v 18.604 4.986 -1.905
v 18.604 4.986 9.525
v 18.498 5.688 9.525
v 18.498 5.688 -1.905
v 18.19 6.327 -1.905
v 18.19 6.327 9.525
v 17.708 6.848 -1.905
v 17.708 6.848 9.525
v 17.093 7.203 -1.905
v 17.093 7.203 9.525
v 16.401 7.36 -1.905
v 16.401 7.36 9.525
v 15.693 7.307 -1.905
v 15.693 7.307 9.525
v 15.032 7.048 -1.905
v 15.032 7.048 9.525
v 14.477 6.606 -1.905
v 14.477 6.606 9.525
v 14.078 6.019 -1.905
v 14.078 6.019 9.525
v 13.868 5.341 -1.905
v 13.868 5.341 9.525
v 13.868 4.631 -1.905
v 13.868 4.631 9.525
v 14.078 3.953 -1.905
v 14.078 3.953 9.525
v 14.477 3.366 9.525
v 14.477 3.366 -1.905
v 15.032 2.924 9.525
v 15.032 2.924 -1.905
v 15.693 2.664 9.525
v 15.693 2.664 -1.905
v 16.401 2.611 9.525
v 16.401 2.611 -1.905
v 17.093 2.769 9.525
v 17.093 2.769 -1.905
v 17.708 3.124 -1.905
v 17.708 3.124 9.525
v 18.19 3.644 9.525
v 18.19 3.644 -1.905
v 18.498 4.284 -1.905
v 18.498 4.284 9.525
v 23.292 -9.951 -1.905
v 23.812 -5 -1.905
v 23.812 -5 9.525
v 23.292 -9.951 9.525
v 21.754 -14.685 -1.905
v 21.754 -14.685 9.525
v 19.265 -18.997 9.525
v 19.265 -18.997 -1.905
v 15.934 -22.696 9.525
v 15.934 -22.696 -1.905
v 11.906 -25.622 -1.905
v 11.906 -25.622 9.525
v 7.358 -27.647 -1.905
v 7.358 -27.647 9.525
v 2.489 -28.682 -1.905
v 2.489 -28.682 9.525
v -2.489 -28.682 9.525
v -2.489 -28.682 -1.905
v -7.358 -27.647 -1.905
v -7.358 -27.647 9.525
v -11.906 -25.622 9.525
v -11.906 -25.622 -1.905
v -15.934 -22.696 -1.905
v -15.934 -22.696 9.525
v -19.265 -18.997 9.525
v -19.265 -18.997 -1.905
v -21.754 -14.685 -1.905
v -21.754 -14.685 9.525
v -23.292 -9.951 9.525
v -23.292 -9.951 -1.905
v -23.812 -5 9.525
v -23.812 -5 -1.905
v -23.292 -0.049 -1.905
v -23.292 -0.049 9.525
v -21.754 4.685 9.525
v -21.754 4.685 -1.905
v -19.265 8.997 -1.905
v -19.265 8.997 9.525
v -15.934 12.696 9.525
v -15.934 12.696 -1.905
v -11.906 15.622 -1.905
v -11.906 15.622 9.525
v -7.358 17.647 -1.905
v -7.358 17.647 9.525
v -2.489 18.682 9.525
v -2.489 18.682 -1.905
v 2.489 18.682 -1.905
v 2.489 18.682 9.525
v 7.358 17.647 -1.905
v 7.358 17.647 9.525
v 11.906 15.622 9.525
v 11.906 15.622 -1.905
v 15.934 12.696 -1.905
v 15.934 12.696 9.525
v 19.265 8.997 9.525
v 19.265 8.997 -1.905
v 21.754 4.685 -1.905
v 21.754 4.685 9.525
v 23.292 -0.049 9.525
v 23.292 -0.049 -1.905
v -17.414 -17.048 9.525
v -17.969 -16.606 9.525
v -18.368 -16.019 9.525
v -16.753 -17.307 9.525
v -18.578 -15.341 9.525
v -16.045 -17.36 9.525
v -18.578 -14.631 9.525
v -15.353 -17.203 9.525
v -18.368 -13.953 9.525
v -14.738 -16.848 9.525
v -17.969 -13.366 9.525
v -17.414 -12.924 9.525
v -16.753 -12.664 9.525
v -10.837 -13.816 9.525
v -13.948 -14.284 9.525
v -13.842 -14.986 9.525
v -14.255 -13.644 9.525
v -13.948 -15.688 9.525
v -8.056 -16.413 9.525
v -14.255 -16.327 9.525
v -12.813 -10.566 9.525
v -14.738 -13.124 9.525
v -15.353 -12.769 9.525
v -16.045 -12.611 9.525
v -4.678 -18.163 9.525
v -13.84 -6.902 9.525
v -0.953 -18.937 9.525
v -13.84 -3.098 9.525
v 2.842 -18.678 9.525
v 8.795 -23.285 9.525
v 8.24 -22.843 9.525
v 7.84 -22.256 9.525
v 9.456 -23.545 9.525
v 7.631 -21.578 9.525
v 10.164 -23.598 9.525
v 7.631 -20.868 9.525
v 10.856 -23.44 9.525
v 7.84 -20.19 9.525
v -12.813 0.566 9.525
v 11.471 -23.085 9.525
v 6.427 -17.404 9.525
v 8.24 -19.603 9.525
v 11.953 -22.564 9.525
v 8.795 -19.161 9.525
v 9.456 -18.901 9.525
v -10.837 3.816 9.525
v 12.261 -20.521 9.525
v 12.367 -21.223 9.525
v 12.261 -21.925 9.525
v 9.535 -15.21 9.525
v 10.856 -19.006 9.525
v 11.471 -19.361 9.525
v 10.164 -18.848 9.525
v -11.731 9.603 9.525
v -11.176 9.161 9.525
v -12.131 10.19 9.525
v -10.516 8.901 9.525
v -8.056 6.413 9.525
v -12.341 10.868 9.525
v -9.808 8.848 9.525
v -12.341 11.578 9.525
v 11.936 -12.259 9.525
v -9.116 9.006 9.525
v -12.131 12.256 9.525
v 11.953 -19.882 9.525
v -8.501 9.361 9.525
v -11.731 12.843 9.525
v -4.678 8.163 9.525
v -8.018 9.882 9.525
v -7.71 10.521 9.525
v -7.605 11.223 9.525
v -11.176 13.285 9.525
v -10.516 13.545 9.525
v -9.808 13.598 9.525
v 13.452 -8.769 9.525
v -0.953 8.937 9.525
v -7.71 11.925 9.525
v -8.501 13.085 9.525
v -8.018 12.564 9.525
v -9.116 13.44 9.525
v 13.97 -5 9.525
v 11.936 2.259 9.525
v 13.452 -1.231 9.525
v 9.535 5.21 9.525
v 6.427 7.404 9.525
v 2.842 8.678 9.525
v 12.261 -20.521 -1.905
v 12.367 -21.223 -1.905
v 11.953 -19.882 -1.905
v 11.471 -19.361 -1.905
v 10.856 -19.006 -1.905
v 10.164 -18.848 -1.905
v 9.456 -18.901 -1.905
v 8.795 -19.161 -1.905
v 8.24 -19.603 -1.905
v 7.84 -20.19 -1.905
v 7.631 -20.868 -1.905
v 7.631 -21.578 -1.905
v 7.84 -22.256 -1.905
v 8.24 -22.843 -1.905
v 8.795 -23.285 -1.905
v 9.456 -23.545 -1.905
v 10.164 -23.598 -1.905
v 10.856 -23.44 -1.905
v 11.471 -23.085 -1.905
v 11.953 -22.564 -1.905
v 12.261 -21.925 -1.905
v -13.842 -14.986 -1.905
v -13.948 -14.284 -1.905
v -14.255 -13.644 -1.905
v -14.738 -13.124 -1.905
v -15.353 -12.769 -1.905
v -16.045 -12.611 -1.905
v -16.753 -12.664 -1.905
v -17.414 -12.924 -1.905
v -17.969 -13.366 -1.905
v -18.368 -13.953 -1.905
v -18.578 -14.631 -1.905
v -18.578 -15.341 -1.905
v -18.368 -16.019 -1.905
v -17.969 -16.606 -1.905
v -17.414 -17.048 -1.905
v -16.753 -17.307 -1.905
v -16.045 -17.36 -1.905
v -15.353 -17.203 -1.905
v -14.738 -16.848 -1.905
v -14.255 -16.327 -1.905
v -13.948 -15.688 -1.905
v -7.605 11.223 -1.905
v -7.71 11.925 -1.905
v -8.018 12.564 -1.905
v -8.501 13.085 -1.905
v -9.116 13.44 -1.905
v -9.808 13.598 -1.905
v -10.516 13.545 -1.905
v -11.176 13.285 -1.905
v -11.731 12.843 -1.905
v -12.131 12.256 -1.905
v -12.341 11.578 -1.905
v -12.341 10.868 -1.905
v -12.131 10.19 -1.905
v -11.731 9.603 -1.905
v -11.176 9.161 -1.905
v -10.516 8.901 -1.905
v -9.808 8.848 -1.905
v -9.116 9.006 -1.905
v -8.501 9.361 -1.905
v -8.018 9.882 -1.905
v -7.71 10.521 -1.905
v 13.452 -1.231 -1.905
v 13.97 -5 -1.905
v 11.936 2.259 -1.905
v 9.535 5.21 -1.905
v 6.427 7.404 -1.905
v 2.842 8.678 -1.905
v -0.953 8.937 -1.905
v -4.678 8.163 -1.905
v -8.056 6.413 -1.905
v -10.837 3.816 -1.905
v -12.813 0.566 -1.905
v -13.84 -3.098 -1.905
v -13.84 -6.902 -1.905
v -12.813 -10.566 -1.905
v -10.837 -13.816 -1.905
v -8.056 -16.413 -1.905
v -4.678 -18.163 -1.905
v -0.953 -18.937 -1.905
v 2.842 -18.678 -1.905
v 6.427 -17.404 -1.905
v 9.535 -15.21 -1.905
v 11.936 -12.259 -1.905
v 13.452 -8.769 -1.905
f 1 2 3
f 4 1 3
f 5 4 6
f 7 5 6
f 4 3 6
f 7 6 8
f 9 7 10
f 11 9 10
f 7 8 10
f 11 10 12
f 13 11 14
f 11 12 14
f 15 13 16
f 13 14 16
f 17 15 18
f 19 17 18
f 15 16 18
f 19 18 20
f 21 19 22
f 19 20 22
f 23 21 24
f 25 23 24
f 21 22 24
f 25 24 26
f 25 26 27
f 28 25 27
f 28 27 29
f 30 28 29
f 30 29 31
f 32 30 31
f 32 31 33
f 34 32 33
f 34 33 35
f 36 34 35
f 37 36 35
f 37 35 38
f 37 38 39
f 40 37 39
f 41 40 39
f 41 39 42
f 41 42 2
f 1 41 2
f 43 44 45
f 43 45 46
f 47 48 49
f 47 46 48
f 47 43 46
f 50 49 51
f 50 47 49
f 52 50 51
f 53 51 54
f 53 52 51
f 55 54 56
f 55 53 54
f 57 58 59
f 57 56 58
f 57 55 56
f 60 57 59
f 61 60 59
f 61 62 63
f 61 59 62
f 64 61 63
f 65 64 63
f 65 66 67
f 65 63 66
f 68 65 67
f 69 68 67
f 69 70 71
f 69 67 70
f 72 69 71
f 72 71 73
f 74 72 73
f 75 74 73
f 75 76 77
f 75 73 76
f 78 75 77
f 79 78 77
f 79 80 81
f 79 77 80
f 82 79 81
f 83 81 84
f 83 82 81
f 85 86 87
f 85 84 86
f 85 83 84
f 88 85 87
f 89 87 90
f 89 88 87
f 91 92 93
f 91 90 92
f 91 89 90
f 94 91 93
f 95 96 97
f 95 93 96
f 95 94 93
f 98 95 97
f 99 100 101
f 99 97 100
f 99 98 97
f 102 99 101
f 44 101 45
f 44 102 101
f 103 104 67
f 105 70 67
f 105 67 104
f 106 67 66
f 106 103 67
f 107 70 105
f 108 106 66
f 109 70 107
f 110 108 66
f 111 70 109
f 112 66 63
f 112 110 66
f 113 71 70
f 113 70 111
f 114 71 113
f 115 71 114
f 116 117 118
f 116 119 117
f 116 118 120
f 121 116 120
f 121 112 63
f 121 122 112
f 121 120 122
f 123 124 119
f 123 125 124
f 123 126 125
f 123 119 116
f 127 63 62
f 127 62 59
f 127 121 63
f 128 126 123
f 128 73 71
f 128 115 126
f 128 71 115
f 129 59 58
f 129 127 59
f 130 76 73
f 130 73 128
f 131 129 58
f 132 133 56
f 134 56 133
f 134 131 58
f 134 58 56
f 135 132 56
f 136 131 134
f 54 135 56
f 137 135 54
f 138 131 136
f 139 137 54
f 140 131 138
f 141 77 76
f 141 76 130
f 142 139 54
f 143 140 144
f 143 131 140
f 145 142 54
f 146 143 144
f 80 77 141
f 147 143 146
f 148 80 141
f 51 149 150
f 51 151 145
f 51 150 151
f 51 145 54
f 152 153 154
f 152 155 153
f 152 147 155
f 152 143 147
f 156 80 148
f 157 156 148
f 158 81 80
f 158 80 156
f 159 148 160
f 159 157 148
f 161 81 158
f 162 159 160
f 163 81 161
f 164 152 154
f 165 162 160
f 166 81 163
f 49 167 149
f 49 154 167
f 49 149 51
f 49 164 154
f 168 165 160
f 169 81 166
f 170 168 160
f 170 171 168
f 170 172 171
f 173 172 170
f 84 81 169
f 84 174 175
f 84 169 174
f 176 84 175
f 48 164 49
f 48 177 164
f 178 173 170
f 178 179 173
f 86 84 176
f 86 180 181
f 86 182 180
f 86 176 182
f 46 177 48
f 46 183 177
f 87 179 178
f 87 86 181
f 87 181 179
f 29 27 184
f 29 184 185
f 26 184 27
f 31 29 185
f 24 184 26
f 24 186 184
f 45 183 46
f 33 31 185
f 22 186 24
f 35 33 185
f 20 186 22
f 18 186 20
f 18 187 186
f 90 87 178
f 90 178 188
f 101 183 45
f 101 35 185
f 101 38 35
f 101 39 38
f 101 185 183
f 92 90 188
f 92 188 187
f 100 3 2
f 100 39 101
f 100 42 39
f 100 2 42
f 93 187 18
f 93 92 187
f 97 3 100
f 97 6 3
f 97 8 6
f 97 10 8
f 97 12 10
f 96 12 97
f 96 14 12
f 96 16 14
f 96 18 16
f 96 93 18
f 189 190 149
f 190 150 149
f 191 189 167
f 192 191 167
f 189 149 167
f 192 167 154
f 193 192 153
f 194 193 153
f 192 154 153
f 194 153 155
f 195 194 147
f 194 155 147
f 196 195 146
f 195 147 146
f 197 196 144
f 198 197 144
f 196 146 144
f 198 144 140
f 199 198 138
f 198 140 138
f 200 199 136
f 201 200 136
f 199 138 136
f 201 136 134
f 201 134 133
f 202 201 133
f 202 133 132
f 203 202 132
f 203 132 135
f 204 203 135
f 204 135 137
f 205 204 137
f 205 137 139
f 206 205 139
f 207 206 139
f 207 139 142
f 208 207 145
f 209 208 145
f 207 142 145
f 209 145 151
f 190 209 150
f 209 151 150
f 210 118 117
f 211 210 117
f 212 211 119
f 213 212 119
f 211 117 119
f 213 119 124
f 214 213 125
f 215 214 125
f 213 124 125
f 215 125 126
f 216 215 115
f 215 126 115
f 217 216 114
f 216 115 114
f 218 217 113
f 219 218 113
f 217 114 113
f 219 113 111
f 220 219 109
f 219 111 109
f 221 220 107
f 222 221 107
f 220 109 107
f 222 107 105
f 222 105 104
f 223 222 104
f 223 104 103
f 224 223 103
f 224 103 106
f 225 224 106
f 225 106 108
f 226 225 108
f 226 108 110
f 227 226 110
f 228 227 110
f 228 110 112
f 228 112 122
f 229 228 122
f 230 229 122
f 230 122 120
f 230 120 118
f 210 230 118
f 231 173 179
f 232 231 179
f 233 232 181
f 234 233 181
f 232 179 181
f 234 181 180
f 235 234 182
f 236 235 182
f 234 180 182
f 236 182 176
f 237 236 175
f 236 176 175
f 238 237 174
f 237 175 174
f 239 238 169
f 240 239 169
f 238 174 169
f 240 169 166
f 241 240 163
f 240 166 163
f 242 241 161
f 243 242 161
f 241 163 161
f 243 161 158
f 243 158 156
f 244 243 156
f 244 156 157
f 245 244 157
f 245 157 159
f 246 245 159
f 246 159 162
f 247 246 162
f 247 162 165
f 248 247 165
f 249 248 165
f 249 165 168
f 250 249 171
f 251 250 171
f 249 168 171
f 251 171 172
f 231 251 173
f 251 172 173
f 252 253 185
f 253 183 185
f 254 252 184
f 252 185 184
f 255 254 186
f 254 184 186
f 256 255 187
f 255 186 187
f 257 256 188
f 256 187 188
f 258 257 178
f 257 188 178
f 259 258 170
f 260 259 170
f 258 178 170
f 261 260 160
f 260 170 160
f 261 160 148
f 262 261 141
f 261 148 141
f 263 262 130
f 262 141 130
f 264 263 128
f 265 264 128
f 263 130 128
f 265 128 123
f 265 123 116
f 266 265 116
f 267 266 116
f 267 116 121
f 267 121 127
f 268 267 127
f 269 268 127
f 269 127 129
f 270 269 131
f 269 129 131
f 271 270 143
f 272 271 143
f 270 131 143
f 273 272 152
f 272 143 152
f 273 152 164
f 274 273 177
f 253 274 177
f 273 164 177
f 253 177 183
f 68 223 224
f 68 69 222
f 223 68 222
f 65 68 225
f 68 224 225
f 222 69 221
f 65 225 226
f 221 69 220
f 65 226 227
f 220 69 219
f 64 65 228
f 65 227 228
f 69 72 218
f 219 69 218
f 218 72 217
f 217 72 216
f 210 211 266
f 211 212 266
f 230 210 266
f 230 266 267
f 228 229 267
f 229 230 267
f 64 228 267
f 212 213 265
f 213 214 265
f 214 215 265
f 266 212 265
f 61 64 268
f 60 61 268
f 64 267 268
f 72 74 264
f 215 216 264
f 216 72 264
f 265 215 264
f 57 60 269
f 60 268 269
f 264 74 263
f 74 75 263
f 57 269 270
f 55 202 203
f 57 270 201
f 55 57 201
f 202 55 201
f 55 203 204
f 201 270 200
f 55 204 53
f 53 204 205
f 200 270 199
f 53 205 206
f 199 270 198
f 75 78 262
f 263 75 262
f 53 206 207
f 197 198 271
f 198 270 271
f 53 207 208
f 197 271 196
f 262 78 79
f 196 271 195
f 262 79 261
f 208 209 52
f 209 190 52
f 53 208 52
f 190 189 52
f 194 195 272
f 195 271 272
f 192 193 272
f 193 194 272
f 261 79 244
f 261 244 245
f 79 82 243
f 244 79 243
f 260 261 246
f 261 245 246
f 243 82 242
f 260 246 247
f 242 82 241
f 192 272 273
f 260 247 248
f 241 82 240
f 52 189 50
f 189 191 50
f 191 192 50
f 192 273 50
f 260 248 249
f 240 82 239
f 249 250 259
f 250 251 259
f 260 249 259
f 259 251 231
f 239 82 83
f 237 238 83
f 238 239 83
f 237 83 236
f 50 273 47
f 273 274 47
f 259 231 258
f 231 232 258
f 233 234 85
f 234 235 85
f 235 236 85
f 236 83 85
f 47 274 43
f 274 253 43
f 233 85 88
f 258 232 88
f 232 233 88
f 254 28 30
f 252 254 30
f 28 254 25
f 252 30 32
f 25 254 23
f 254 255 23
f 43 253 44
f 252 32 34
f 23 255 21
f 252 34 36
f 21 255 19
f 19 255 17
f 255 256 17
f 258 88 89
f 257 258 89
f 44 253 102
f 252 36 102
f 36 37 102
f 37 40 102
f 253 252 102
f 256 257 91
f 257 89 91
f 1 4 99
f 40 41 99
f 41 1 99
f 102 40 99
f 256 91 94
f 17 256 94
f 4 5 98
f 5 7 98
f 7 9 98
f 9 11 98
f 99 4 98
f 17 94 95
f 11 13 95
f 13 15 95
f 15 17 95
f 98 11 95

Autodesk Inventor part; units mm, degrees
ref_plane "YZ Plane" through (0, 0, 0) normal (1, 0, 0) x (0, 1, 0)
ref_plane "XZ Plane" through (0, 0, 0) normal (0, 1, 0) x (-1, 0, 0)
ref_plane "XY Plane" through (0, 0, 0) normal (0, 0, 1) x (1, 0, 0)
sketch "Sketch1" plane through (0, 0, 0) normal (0, 0, 1) x (1, 0, 0)
  circle A0 centre (0, -5) radius 23.8125
  ellipse E0 centre (-25.066556, -29.009567) end of major axis (-17.396721, -26.490299) minor radius 5.878917 (-26.90757, -23.426346) -> (-26.90757, -23.426346) ccw
  line L0 (-26.90757, -23.426346) -> (-27.832023, -23.737709)
  line L1 (-29.265886, -21.408265) -> (-28.524708, -20.677009)
  ellipse E1 centre (-32.727164, -16.564341) end of major axis (-27.02296, -10.851314) minor radius 5.879236 (-28.571485, -20.72316) -> (-28.525164, -20.676548) ccw
  ellipse E2 centre (-32.346551, -17.58951) end of major axis (-24.296384, -18.197133) minor radius 5.879035 (-31.91081, -11.726643) -> (-31.91081, -11.726643) ccw
  line L2 (-31.91081, -11.726643) -> (-32.884047, -11.660532)
  line L3 (-33.317324, -8.95969) -> (-32.352726, -8.567735)
  ellipse E3 centre (-34.661269, -3.160316) end of major axis (-27.205269, -0.065183) minor radius 5.878801 (-32.413603, -8.592472) -> (-32.35297, -8.567134) ccw
  ellipse E4 centre (-34.70212, -4.252716) end of major axis (-41.906987, -0.610674) minor radius 5.879052 (-32.055919, 0.997131) -> (-32.055919, 0.997131) ccw
  line L4 (-32.055919, 0.997131) -> (-32.929773, 1.430651)
  line L5 (-32.296502, 4.091711) -> (-31.255334, 4.084695)
  ellipse E5 centre (-31.318819, 9.963759) end of major axis (-23.246042, 9.970002) minor radius 5.878619 (-31.321044, 4.085138) -> (-31.25533, 4.085343) ccw
  ellipse E6 centre (-31.774878, 8.970095) end of major axis (-37.03772, 15.092271) minor radius 5.879409 (-27.320805, 12.807895) -> (-27.320805, 12.807895) ccw
  line L6 (-27.320805, 12.807895) -> (-27.96224, 13.542826)
  line L7 (-26.35883, 15.758982) -> (-25.399601, 15.354063)
  ellipse E7 centre (-23.208166, 20.81056) end of major axis (-30.669277, 23.894301) minor radius 5.879328 (-25.46014, 15.379618) -> (-25.399349, 15.35466) ccw
  ellipse E8 centre (-24.009591, 20.066548) end of major axis (-26.528865, 27.736399) minor radius 5.878942 (-18.426346, 21.90757) -> (-18.426346, 21.90757) ccw
  line L8 (-18.426346, 21.90757) -> (-18.737709, 22.832023)
  line L9 (-16.408265, 24.265886) -> (-15.677009, 23.524708)
  ellipse E9 centre (-11.564623, 27.726877) end of major axis (-17.277457, 33.430884) minor radius 5.878834 (-15.72316, 23.571485) -> (-15.676548, 23.525164) ccw
  ellipse E10 centre (-12.589421, 27.346544) end of major axis (-11.981802, 35.39665) minor radius 5.878946 (-6.726643, 26.91081) -> (-6.726643, 26.91081) ccw
  line L10 (-6.726643, 26.91081) -> (-6.660532, 27.884047)
  line L11 (-3.95969, 28.317324) -> (-3.567735, 27.352726)
  ellipse E11 centre (1.839847, 29.661337) end of major axis (-1.255331, 37.11745) minor radius 5.878977 (-3.592472, 27.413603) -> (-3.567134, 27.35297) ccw
  ellipse E12 centre (0.747946, 29.701782) end of major axis (4.389762, 36.906192) minor radius 5.878309 (5.997131, 27.055919) -> (5.997131, 27.055919) ccw
  line L12 (5.997131, 27.055919) -> (6.430651, 27.929773)
  line L13 (9.091711, 27.296502) -> (9.084695, 26.255334)
  ellipse E13 centre (14.963894, 26.318821) end of major axis (14.957652, 34.391691) minor radius 5.878755 (9.085138, 26.321044) -> (9.085343, 26.25533) ccw
  ellipse E14 centre (13.970251, 26.774696) end of major axis (20.092302, 32.03743) minor radius 5.87917 (17.807895, 22.320805) -> (17.807895, 22.320805) ccw
  line L14 (17.807895, 22.320805) -> (18.542826, 22.96224)
  line L15 (20.758982, 21.35883) -> (20.354063, 20.399601)
  ellipse E15 centre (25.810277, 18.208281) end of major axis (28.893936, 25.669199) minor radius 5.879023 (20.379618, 20.46014) -> (20.35466, 20.399349) ccw
  ellipse E16 centre (25.066434, 19.009945) end of major axis (32.736527, 21.529301) minor radius 5.879314 (26.90757, 13.426346) -> (26.90757, 13.426346) ccw
  line L16 (26.90757, 13.426346) -> (27.832023, 13.737709)
  line L17 (29.265886, 11.408265) -> (28.524708, 10.677009)
  ellipse E17 centre (32.727281, 6.564224) end of major axis (38.431566, 12.277331) minor radius 5.879402 (28.571485, 10.72316) -> (28.525164, 10.676548) ccw
  ellipse E18 centre (32.346566, 7.5897) end of major axis (40.396864, 6.982068) minor radius 5.879226 (31.91081, 1.726643) -> (31.91081, 1.726643) ccw
  line L18 (31.91081, 1.726643) -> (32.884047, 1.660532)
  line L19 (33.317324, -1.04031) -> (32.352726, -1.432265)
  ellipse E19 centre (34.661448, -6.840109) end of major axis (42.117742, -3.744858) minor radius 5.879261 (32.413603, -1.407528) -> (32.35297, -1.432866) ccw
  ellipse E20 centre (34.701968, -5.747582) end of major axis (27.497307, -2.105643) minor radius 5.878717 (32.055919, -10.997131) -> (32.055919, -10.997131) ccw
  line L20 (32.055919, -10.997131) -> (32.929773, -11.430651)
  line L21 (32.296502, -14.091711) -> (31.255334, -14.084695)
  ellipse E21 centre (31.318824, -19.964675) end of major axis (39.392231, -19.958437) minor radius 5.879535 (31.321044, -14.085138) -> (31.25533, -14.085343) ccw
  ellipse E22 centre (31.774631, -18.970306) end of major axis (26.511936, -12.848298) minor radius 5.879085 (27.320805, -22.807895) -> (27.320805, -22.807895) ccw
  line L22 (27.320805, -22.807895) -> (27.96224, -23.542826)
  line L23 (26.35883, -25.758982) -> (25.399601, -25.354063)
  ellipse E23 centre (23.208233, -30.810396) end of major axis (15.747234, -27.726703) minor radius 5.879151 (25.46014, -25.379618) -> (25.399349, -25.35466) ccw
  ellipse E24 centre (24.00979, -30.066484) end of major axis (21.49047, -22.396496) minor radius 5.879152 (18.426346, -31.90757) -> (18.426346, -31.90757) ccw
  line L24 (18.426346, -31.90757) -> (18.737709, -32.832023)
  line L25 (16.408265, -34.265886) -> (15.677009, -33.524708)
  ellipse E25 centre (11.564423, -37.72708) end of major axis (5.851452, -32.022934) minor radius 5.879119 (15.72316, -33.571485) -> (15.676548, -33.525164) ccw
  ellipse E26 centre (12.58943, -37.346545) end of major axis (13.19705, -29.296433) minor radius 5.878955 (6.726643, -36.91081) -> (6.726643, -36.91081) ccw
  line L26 (6.726643, -36.91081) -> (6.660532, -37.884047)
  line L27 (3.95969, -38.317324) -> (3.567735, -37.352726)
  ellipse E27 centre (-1.840043, -39.66142) end of major axis (-4.935276, -32.205172) minor radius 5.87919 (3.592472, -37.413603) -> (3.567134, -37.35297) ccw
  ellipse E28 centre (-0.747551, -39.701984) end of major axis (2.8944, -32.497302) minor radius 5.878752 (-5.997131, -37.055919) -> (-5.997131, -37.055919) ccw
  line L28 (-5.997131, -37.055919) -> (-6.430651, -37.929773)
  line L29 (-9.091711, -37.296502) -> (-9.084695, -36.255334)
  ellipse E29 centre (-14.964581, -36.318823) end of major axis (-14.970819, -28.245481) minor radius 5.879441 (-9.085138, -36.321044) -> (-9.085343, -36.25533) ccw
  ellipse E30 centre (-13.970405, -36.774515) end of major axis (-7.848476, -31.511889) minor radius 5.878932 (-17.807895, -32.320805) -> (-17.807895, -32.320805) ccw
  line L30 (-17.807895, -32.320805) -> (-18.542826, -32.96224)
  line L31 (-20.758982, -31.35883) -> (-20.354063, -30.399601)
  ellipse E31 centre (-25.810473, -28.208202) end of major axis (-22.726757, -20.74715) minor radius 5.879234 (-20.379618, -30.46014) -> (-20.35466, -30.399349) ccw
  arc A1 (-20.35466, -30.399349) -> (-19.644418, -27.762867) centre (-30.622228, -26.219462) ccw
  arc A2 (-19.644418, -27.762867) -> (-24.163023, -22.894122) centre (-23.857511, -27.141776) ccw
  arc A3 (-24.163023, -22.894122) -> (-26.845089, -23.405986) centre (-23.441695, -33.956404) ccw
  arc A4 (-28.525164, -20.676548) -> (-26.860048, -18.512554) centre (-36.411586, -12.885608) ccw
  arc A5 (-26.860048, -18.512554) -> (-29.171506, -12.285224) centre (-30.514757, -16.32646) ccw
  arc A6 (-29.171506, -12.285224) -> (-31.845294, -11.731743) centre (-32.738439, -22.781481) ccw
  arc A7 (-32.35297, -8.567134) -> (-29.986479, -7.205076) centre (-36.657611, 1.648759) ccw
  arc A8 (-29.986479, -7.205076) -> (-29.738892, -0.567217) centre (-32.526408, -3.786792) ccw
  arc A9 (-29.738892, -0.567217) -> (-31.997342, 0.967347) centre (-37.051052, -8.899488) ccw
  arc A10 (-31.25533, 4.085343) -> (-28.54774, 4.438104) centre (-31.322846, 15.170913) ccw
  arc A11 (-28.54774, 4.438104) -> (-25.778801, 10.475939) centre (-29.586208, 8.568175) ccw
  arc A12 (-25.778801, 10.475939) -> (-27.278084, 12.757962) centre (-35.722978, 5.576167) ccw
  arc A13 (-25.399349, 15.35466) -> (-22.762867, 14.644418) centre (-21.219462, 25.622228) ccw
  arc A14 (-22.762867, 14.644418) -> (-17.894122, 19.163023) centre (-22.141776, 18.857511) ccw
  arc A15 (-17.894122, 19.163023) -> (-18.405986, 21.845089) centre (-28.956404, 18.441695) ccw
  arc A16 (-15.676548, 23.525164) -> (-13.512554, 21.860048) centre (-7.885608, 31.411586) ccw
  arc A17 (-13.512554, 21.860048) -> (-7.285224, 24.171506) centre (-11.32646, 25.514757) ccw
  arc A18 (-7.285224, 24.171506) -> (-6.731743, 26.845294) centre (-17.781481, 27.738439) ccw
  arc A19 (-3.567134, 27.35297) -> (-2.205076, 24.986479) centre (6.648759, 31.657611) ccw
  arc A20 (-2.205076, 24.986479) -> (4.432783, 24.738892) centre (1.213208, 27.526408) ccw
  arc A21 (4.432783, 24.738892) -> (5.967347, 26.997342) centre (-3.899488, 32.051052) ccw
  arc A22 (9.085343, 26.25533) -> (9.438104, 23.54774) centre (20.170913, 26.322846) ccw
  arc A23 (9.438104, 23.54774) -> (15.475939, 20.778801) centre (13.568175, 24.586208) ccw
  arc A24 (15.475939, 20.778801) -> (17.757962, 22.278084) centre (10.576167, 30.722978) ccw
  arc A25 (20.35466, 20.399349) -> (19.644418, 17.762867) centre (30.622228, 16.219462) ccw
  arc A26 (19.644418, 17.762867) -> (24.163023, 12.894122) centre (23.857511, 17.141776) ccw
  arc A27 (24.163023, 12.894122) -> (26.845089, 13.405986) centre (23.441695, 23.956404) ccw
  arc A28 (28.525164, 10.676548) -> (26.860048, 8.512554) centre (36.411586, 2.885608) ccw
  arc A29 (26.860048, 8.512554) -> (29.171506, 2.285224) centre (30.514757, 6.32646) ccw
  arc A30 (29.171506, 2.285224) -> (31.845294, 1.731743) centre (32.738439, 12.781481) ccw
  arc A31 (32.35297, -1.432866) -> (29.986479, -2.794924) centre (36.657611, -11.648759) ccw
  arc A32 (29.986479, -2.794924) -> (29.738892, -9.432783) centre (32.526408, -6.213208) ccw
  arc A33 (29.738892, -9.432783) -> (31.997342, -10.967347) centre (37.051052, -1.100512) ccw
  arc A34 (31.25533, -14.085343) -> (28.54774, -14.438104) centre (31.322846, -25.170913) ccw
  arc A35 (28.54774, -14.438104) -> (25.778801, -20.475939) centre (29.586208, -18.568175) ccw
  arc A36 (25.778801, -20.475939) -> (27.278084, -22.757962) centre (35.722978, -15.576167) ccw
  arc A37 (25.399349, -25.35466) -> (22.762867, -24.644418) centre (21.219462, -35.622228) ccw
  arc A38 (22.762867, -24.644418) -> (17.894122, -29.163023) centre (22.141776, -28.857511) ccw
  arc A39 (17.894122, -29.163023) -> (18.405986, -31.845089) centre (28.956404, -28.441695) ccw
  arc A40 (15.676548, -33.525164) -> (13.512554, -31.860048) centre (7.885608, -41.411586) ccw
  arc A41 (13.512554, -31.860048) -> (7.285224, -34.171506) centre (11.32646, -35.514757) ccw
  arc A42 (7.285224, -34.171506) -> (6.731743, -36.845294) centre (17.781481, -37.738439) ccw
  arc A43 (3.567134, -37.35297) -> (2.205076, -34.986479) centre (-6.648759, -41.657611) ccw
  arc A44 (2.205076, -34.986479) -> (-4.432783, -34.738892) centre (-1.213208, -37.526408) ccw
  arc A45 (-4.432783, -34.738892) -> (-5.967347, -36.997342) centre (3.899488, -42.051052) ccw
  arc A46 (-9.085343, -36.25533) -> (-9.438104, -33.54774) centre (-20.170913, -36.322846) ccw
  arc A47 (-9.438104, -33.54774) -> (-15.475939, -30.778801) centre (-13.568175, -34.586208) ccw
  arc A48 (-15.475939, -30.778801) -> (-17.757962, -32.278084) centre (-10.576167, -40.722978) ccw
  circle A49 centre (0, -5) radius 13.97
  arc A50 (-30.44477, -24.101609) -> (-27.832023, -23.737709) centre (-30.102742, -16.995817) ccw
  arc A51 (-30.767675, -23.57702) -> (-30.44477, -24.101609) centre (0, -5) ccw
  arc A52 (-29.265886, -21.408265) -> (-30.767675, -23.57702) centre (-24.269527, -26.472419) ccw
  arc A53 (-35.437169, -10.996877) -> (-32.884047, -11.660532) centre (-32.401908, -4.562869) ccw
  arc A54 (-35.534743, -10.388649) -> (-35.437169, -10.996877) centre (0, -5) ccw
  arc A55 (-33.317324, -8.95969) -> (-35.534743, -10.388649) centre (-30.639258, -15.550383) ccw
  arc A56 (-35.034581, 3.020825) -> (-32.929773, 1.430651) centre (-29.768177, 7.803529) ccw
  arc A57 (-34.891968, 3.620095) -> (-35.034581, 3.020825) centre (0, -5) ccw
  arc A58 (-32.296502, 4.091711) -> (-34.891968, 3.620095) centre (-32.34444, -3.022146) ccw
  arc A59 (-29.298295, 15.81743) -> (-27.96224, 13.542826) centre (-22.602511, 18.220707) ccw
  arc A60 (-28.937208, 16.316507) -> (-29.298295, 15.81743) centre (0, -5) ccw
  arc A61 (-26.35883, 15.758982) -> (-28.937208, 16.316507) centre (-29.125474, 9.20498) ccw
  arc A62 (-19.101609, 25.44477) -> (-18.737709, 22.832023) centre (-11.995817, 25.102742) ccw
  arc A63 (-18.57702, 25.767675) -> (-19.101609, 25.44477) centre (0, -5) ccw
  arc A64 (-16.408265, 24.265886) -> (-18.57702, 25.767675) centre (-21.472419, 19.269527) ccw
  arc A65 (-5.996877, 30.437169) -> (-6.660532, 27.884047) centre (0.437131, 27.401908) ccw
  arc A66 (-5.388649, 30.534743) -> (-5.996877, 30.437169) centre (0, -5) ccw
  arc A67 (-3.95969, 28.317324) -> (-5.388649, 30.534743) centre (-10.550383, 25.639258) ccw
  arc A68 (8.020825, 30.034581) -> (6.430651, 27.929773) centre (12.803529, 24.768177) ccw
  arc A69 (8.620095, 29.891968) -> (8.020825, 30.034581) centre (0, -5) ccw
  arc A70 (9.091711, 27.296502) -> (8.620095, 29.891968) centre (1.977854, 27.34444) ccw
  arc A71 (20.81743, 24.298295) -> (18.542826, 22.96224) centre (23.220707, 17.602511) ccw
  arc A72 (21.316507, 23.937208) -> (20.81743, 24.298295) centre (0, -5) ccw
  arc A73 (20.758982, 21.35883) -> (21.316507, 23.937208) centre (14.20498, 24.125474) ccw
  arc A74 (30.44477, 14.101609) -> (27.832023, 13.737709) centre (30.102742, 6.995817) ccw
  arc A75 (30.767675, 13.57702) -> (30.44477, 14.101609) centre (0, -5) ccw
  arc A76 (29.265886, 11.408265) -> (30.767675, 13.57702) centre (24.269527, 16.472419) ccw
  arc A77 (35.437169, 0.996877) -> (32.884047, 1.660532) centre (32.401908, -5.437131) ccw
  arc A78 (35.534743, 0.388649) -> (35.437169, 0.996877) centre (0, -5) ccw
  arc A79 (33.317324, -1.04031) -> (35.534743, 0.388649) centre (30.639258, 5.550383) ccw
  arc A80 (35.034581, -13.020825) -> (32.929773, -11.430651) centre (29.768177, -17.803529) ccw
  arc A81 (34.891968, -13.620095) -> (35.034581, -13.020825) centre (0, -5) ccw
  arc A82 (32.296502, -14.091711) -> (34.891968, -13.620095) centre (32.34444, -6.977854) ccw
  arc A83 (29.298295, -25.81743) -> (27.96224, -23.542826) centre (22.602511, -28.220707) ccw
  arc A84 (28.937208, -26.316507) -> (29.298295, -25.81743) centre (0, -5) ccw
  arc A85 (26.35883, -25.758982) -> (28.937208, -26.316507) centre (29.125474, -19.20498) ccw
  arc A86 (19.101609, -35.44477) -> (18.737709, -32.832023) centre (11.995817, -35.102742) ccw
  arc A87 (18.57702, -35.767675) -> (19.101609, -35.44477) centre (0, -5) ccw
  arc A88 (16.408265, -34.265886) -> (18.57702, -35.767675) centre (21.472419, -29.269527) ccw
  arc A89 (5.996877, -40.437169) -> (6.660532, -37.884047) centre (-0.437131, -37.401908) ccw
  arc A90 (5.388649, -40.534743) -> (5.996877, -40.437169) centre (0, -5) ccw
  arc A91 (3.95969, -38.317324) -> (5.388649, -40.534743) centre (10.550383, -35.639258) ccw
  arc A92 (-8.020825, -40.034581) -> (-6.430651, -37.929773) centre (-12.803529, -34.768177) ccw
  arc A93 (-8.620095, -39.891968) -> (-8.020825, -40.034581) centre (0, -5) ccw
  arc A94 (-9.091711, -37.296502) -> (-8.620095, -39.891968) centre (-1.977854, -37.34444) ccw
  arc A95 (-20.81743, -34.298295) -> (-18.542826, -32.96224) centre (-23.220707, -27.602511) ccw
  arc A96 (-21.316507, -33.937208) -> (-20.81743, -34.298295) centre (0, -5) ccw
  arc A97 (-20.758982, -31.35883) -> (-21.316507, -33.937208) centre (-14.20498, -34.125474) ccw
  circle A98 centre (16.222975, 4.985869) radius 2.38125
  circle A99 centre (9.985869, -21.222975) radius 2.38125
  circle A100 centre (-9.985869, 11.222975) radius 2.38125
  circle A101 centre (-16.222975, -14.985869) radius 2.38125
  point P0 (0, 0)
  dimension "d0" = 47.625
sketch "Sketch1 outline for Extrusion1" plane through (0, 0, 0) normal (0, 0, 1) x (1, 0, 0)
  circle A0 centre (0, -5) radius 23.8125
extrude "Extrusion1" add sketch "Sketch1 outline for Extrusion1" along normal blind 9.525
sketch "Sketch2" plane through (0, -5, 9.525) normal (0, 0, 1) x (1, 0, 0)
  circle A0 centre (0, 0) radius 13.97
  point P0 (0, 5)
  dimension "d3" = 27.94
extrude "Extrusion2" cut sketch "Sketch2" against normal blind 26.9875
sketch "Sketch3" plane through (0, -5, 9.525) normal (0, 0, 1) x (1, 0, 0)
  circle A0 centre (0, 0) radius 13.97 projected
  circle A1 centre (0, 0) radius 23.8125 projected
  point P0 (0, 5)
extrude "Extrusion3" add sketch "Sketch3" against normal blind 11.43
sketch "Sketch4" plane through (0, -5, 9.525) normal (0, 0, 1) x (1, 0, 0)
  circle A0 centre (16.222975, 9.985869) radius 2.38125
  circle A1 centre (9.985869, -16.222975) radius 2.38125
  circle A2 centre (-9.985869, 16.222975) radius 2.38125
  circle A3 centre (-16.222975, -9.985869) radius 2.38125
  circle A4 centre (0, 0) radius 13.97
  arc A5 (32.35297, 3.567134) -> (31.845294, 6.731743) centre (0, 0) ccw
  arc A6 (29.171506, 7.285224) -> (31.845294, 6.731743) centre (32.738439, 17.781481) ccw
  arc A7 (26.860048, 13.512554) -> (29.171506, 7.285224) centre (30.514757, 11.32646) ccw
  arc A8 (28.525164, 15.676548) -> (26.860048, 13.512554) centre (36.411586, 7.885608) ccw
  arc A9 (28.525164, 15.676548) -> (26.845089, 18.405986) centre (0, 0) ccw
  arc A10 (24.163023, 17.894122) -> (26.845089, 18.405986) centre (23.441695, 28.956404) ccw
  arc A11 (19.644418, 22.762867) -> (24.163023, 17.894122) centre (23.857511, 22.141776) ccw
  arc A12 (20.35466, 25.399349) -> (19.644418, 22.762867) centre (30.622228, 21.219462) ccw
  arc A13 (20.35466, 25.399349) -> (17.757962, 27.278084) centre (0, 0) ccw
  arc A14 (15.475939, 25.778801) -> (17.757962, 27.278084) centre (10.576167, 35.722978) ccw
  arc A15 (9.438104, 28.54774) -> (15.475939, 25.778801) centre (13.568175, 29.586208) ccw
  arc A16 (9.085343, 31.25533) -> (9.438104, 28.54774) centre (20.170913, 31.322846) ccw
  arc A17 (9.085343, 31.25533) -> (5.967347, 31.997342) centre (0, 0) ccw
  arc A18 (4.432783, 29.738892) -> (5.967347, 31.997342) centre (-3.899488, 37.051052) ccw
  arc A19 (-2.205076, 29.986479) -> (4.432783, 29.738892) centre (1.213208, 32.526408) ccw
  arc A20 (-3.567134, 32.35297) -> (-2.205076, 29.986479) centre (6.648759, 36.657611) ccw
  arc A21 (-3.567134, 32.35297) -> (-6.731743, 31.845294) centre (0, 0) ccw
  arc A22 (-7.285224, 29.171506) -> (-6.731743, 31.845294) centre (-17.781481, 32.738439) ccw
  arc A23 (-13.512554, 26.860048) -> (-7.285224, 29.171506) centre (-11.32646, 30.514757) ccw
  arc A24 (-15.676548, 28.525164) -> (-13.512554, 26.860048) centre (-7.885608, 36.411586) ccw
  arc A25 (-15.676548, 28.525164) -> (-18.405986, 26.845089) centre (0, 0) ccw
  arc A26 (-17.894122, 24.163023) -> (-18.405986, 26.845089) centre (-28.956404, 23.441695) ccw
  arc A27 (-22.762867, 19.644418) -> (-17.894122, 24.163023) centre (-22.141776, 23.857511) ccw
  arc A28 (-25.399349, 20.35466) -> (-22.762867, 19.644418) centre (-21.219462, 30.622228) ccw
  arc A29 (-25.399349, 20.35466) -> (-27.278084, 17.757962) centre (0, 0) ccw
  arc A30 (-25.778801, 15.475939) -> (-27.278084, 17.757962) centre (-35.722978, 10.576167) ccw
  arc A31 (-28.54774, 9.438104) -> (-25.778801, 15.475939) centre (-29.586208, 13.568175) ccw
  arc A32 (-31.25533, 9.085343) -> (-28.54774, 9.438104) centre (-31.322846, 20.170913) ccw
  arc A33 (-31.25533, 9.085343) -> (-31.997342, 5.967347) centre (0, 0) ccw
  arc A34 (-29.738892, 4.432783) -> (-31.997342, 5.967347) centre (-37.051052, -3.899488) ccw
  arc A35 (-29.986479, -2.205076) -> (-29.738892, 4.432783) centre (-32.526408, 1.213208) ccw
  arc A36 (-32.35297, -3.567134) -> (-29.986479, -2.205076) centre (-36.657611, 6.648759) ccw
  arc A37 (-32.35297, -3.567134) -> (-31.845294, -6.731743) centre (0, 0) ccw
  arc A38 (-29.171506, -7.285224) -> (-31.845294, -6.731743) centre (-32.738439, -17.781481) ccw
  arc A39 (-26.860048, -13.512554) -> (-29.171506, -7.285224) centre (-30.514757, -11.32646) ccw
  arc A40 (-28.525164, -15.676548) -> (-26.860048, -13.512554) centre (-36.411586, -7.885608) ccw
  arc A41 (-28.525164, -15.676548) -> (-26.845089, -18.405986) centre (0, 0) ccw
  arc A42 (-24.163023, -17.894122) -> (-26.845089, -18.405986) centre (-23.441695, -28.956404) ccw
  arc A43 (-19.644418, -22.762867) -> (-24.163023, -17.894122) centre (-23.857511, -22.141776) ccw
  arc A44 (-20.35466, -25.399349) -> (-19.644418, -22.762867) centre (-30.622228, -21.219462) ccw
  arc A45 (-20.35466, -25.399349) -> (-17.757962, -27.278084) centre (0, 0) ccw
  arc A46 (-15.475939, -25.778801) -> (-17.757962, -27.278084) centre (-10.576167, -35.722978) ccw
  arc A47 (-9.438104, -28.54774) -> (-15.475939, -25.778801) centre (-13.568175, -29.586208) ccw
  arc A48 (-9.085343, -31.25533) -> (-9.438104, -28.54774) centre (-20.170913, -31.322846) ccw
  arc A49 (-9.085343, -31.25533) -> (-5.967347, -31.997342) centre (0, 0) ccw
  arc A50 (-4.432783, -29.738892) -> (-5.967347, -31.997342) centre (3.899488, -37.051052) ccw
  arc A51 (2.205076, -29.986479) -> (-4.432783, -29.738892) centre (-1.213208, -32.526408) ccw
  arc A52 (3.567134, -32.35297) -> (2.205076, -29.986479) centre (-6.648759, -36.657611) ccw
  arc A53 (3.567134, -32.35297) -> (6.731743, -31.845294) centre (0, 0) ccw
  arc A54 (7.285224, -29.171506) -> (6.731743, -31.845294) centre (17.781481, -32.738439) ccw
  arc A55 (13.512554, -26.860048) -> (7.285224, -29.171506) centre (11.32646, -30.514757) ccw
  arc A56 (15.676548, -28.525164) -> (13.512554, -26.860048) centre (7.885608, -36.411586) ccw
  arc A57 (15.676548, -28.525164) -> (18.405986, -26.845089) centre (0, 0) ccw
  arc A58 (17.894122, -24.163023) -> (18.405986, -26.845089) centre (28.956404, -23.441695) ccw
  arc A59 (22.762867, -19.644418) -> (17.894122, -24.163023) centre (22.141776, -23.857511) ccw
  arc A60 (25.399349, -20.35466) -> (22.762867, -19.644418) centre (21.219462, -30.622228) ccw
  arc A61 (25.399349, -20.35466) -> (27.278084, -17.757962) centre (0, 0) ccw
  arc A62 (25.778801, -15.475939) -> (27.278084, -17.757962) centre (35.722978, -10.576167) ccw
  arc A63 (28.54774, -9.438104) -> (25.778801, -15.475939) centre (29.586208, -13.568175) ccw
  arc A64 (31.25533, -9.085343) -> (28.54774, -9.438104) centre (31.322846, -20.170913) ccw
  arc A65 (31.25533, -9.085343) -> (31.997342, -5.967347) centre (0, 0) ccw
  arc A66 (29.738892, -4.432783) -> (31.997342, -5.967347) centre (37.051052, 3.899488) ccw
  arc A67 (29.986479, 2.205076) -> (29.738892, -4.432783) centre (32.526408, -1.213208) ccw
  arc A68 (32.35297, 3.567134) -> (29.986479, 2.205076) centre (36.657611, -6.648759) ccw
  point P0 (0, 5)
extrude "Extrusion4" cut sketch "Sketch4" against normal blind 11.43 contours A0 | A1 | A2 | A3
thread "Thread1" size "10-24 UNC" class "2B" standard "ANSI Unified Screw Threads" full length
thread "Thread2" size "10-24 UNC" class "2B" standard "ANSI Unified Screw Threads" full length
thread "Thread3" size "10-24 UNC" class "2B" standard "ANSI Unified Screw Threads" full length
thread "Thread4" size "10-24 UNC" class "2B" standard "ANSI Unified Screw Threads" full length
